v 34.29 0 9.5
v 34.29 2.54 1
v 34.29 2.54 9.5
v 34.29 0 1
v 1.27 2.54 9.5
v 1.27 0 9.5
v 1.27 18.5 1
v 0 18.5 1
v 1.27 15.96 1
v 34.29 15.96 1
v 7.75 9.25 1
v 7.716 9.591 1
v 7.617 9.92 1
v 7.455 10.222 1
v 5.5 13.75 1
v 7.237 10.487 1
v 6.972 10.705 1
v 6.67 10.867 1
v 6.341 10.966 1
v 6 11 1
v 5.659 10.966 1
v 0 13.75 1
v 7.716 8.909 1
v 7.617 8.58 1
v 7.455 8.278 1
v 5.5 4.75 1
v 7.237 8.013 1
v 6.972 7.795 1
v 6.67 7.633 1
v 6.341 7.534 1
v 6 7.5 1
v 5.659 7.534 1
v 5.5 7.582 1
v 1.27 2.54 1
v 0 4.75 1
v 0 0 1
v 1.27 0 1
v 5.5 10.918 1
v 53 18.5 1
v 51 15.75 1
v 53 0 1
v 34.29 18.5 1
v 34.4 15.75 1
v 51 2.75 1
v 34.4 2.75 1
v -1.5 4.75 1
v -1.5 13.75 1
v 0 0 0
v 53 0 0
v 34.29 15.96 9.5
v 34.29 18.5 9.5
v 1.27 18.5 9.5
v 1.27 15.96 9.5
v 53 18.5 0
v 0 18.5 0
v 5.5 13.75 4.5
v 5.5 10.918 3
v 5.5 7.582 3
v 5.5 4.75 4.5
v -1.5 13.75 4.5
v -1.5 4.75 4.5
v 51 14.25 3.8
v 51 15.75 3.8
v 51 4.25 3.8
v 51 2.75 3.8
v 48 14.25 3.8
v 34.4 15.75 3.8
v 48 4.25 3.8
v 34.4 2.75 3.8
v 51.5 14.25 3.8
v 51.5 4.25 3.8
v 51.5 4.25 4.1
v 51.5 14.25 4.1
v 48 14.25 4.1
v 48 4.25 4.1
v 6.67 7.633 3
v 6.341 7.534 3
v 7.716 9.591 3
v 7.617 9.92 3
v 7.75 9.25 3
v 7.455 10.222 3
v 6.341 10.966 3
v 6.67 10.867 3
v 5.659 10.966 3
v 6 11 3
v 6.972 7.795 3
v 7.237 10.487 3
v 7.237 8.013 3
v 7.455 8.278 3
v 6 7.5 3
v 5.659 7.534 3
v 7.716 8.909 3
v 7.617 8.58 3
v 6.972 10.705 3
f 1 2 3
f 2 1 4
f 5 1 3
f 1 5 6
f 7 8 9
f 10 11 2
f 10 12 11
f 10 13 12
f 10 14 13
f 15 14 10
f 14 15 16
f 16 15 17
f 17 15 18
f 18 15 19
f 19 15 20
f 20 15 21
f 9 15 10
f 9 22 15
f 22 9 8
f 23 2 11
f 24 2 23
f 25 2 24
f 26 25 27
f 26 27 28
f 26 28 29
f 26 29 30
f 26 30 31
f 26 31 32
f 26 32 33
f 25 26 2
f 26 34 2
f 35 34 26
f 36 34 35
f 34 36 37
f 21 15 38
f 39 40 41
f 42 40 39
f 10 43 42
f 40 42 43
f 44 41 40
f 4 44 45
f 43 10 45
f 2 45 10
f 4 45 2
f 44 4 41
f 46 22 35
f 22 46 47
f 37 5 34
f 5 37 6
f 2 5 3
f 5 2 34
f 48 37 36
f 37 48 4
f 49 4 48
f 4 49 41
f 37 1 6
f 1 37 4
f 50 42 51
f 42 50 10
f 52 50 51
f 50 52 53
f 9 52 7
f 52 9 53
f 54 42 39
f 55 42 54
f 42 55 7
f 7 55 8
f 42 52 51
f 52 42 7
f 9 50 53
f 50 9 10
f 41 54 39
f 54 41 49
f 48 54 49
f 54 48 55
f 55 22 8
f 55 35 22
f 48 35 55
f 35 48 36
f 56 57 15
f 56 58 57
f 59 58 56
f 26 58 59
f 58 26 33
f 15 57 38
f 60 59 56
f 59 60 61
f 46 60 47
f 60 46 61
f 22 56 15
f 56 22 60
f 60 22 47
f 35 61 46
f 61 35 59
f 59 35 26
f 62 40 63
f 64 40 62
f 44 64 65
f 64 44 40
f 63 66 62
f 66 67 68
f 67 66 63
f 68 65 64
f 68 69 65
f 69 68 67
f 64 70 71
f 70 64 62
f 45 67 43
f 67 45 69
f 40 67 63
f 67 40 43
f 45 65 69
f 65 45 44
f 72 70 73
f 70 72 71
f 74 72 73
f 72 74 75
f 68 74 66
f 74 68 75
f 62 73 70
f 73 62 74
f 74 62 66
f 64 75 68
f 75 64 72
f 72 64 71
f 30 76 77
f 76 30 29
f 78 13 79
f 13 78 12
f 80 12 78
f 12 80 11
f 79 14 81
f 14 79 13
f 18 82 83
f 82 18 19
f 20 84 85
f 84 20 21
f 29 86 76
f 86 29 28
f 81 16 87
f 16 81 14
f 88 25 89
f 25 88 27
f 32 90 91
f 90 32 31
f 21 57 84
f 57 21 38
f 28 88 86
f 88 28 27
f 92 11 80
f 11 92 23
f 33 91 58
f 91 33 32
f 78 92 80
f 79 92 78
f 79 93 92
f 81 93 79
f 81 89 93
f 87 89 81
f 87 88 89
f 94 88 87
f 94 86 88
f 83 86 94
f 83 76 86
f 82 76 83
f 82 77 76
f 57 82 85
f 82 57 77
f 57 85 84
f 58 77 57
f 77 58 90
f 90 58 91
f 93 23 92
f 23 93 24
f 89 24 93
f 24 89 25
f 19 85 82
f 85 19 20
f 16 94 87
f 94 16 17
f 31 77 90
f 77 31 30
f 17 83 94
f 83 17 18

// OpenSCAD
$fn = 32;
pcb_w = 53.0; pcb_h = 18.5; pcb_t = 1.0;

// PCB
color("green") cube([pcb_w, pcb_h, pcb_t]);

// Pin headers: 2x 13-pin along long edges
color([0.2,0.2,0.2]) {
    translate([1.27, 0, pcb_t]) cube([13*2.54, 2.54, 8.5]);
    translate([1.27, pcb_h-2.54, pcb_t]) cube([13*2.54, 2.54, 8.5]);
}

// USB-C connector
color("silver") translate([-1.5, (pcb_h-9)/2, pcb_t]) cube([7, 9, 3.5]);

// ESP32-C3-MINI module
color("silver") translate([pcb_w-16.6-2.0, (pcb_h-13)/2, pcb_t]) cube([16.6, 13, 2.8]);

// Antenna area
color([0.9,0.85,0.7]) translate([pcb_w-5.0, (pcb_h-10)/2, pcb_t+2.8]) cube([3.5, 10, 0.3]);

// Reset button
color([0.3,0.3,0.3]) translate([6.0, pcb_h/2, pcb_t]) cylinder(d=3.5, h=2.0);
